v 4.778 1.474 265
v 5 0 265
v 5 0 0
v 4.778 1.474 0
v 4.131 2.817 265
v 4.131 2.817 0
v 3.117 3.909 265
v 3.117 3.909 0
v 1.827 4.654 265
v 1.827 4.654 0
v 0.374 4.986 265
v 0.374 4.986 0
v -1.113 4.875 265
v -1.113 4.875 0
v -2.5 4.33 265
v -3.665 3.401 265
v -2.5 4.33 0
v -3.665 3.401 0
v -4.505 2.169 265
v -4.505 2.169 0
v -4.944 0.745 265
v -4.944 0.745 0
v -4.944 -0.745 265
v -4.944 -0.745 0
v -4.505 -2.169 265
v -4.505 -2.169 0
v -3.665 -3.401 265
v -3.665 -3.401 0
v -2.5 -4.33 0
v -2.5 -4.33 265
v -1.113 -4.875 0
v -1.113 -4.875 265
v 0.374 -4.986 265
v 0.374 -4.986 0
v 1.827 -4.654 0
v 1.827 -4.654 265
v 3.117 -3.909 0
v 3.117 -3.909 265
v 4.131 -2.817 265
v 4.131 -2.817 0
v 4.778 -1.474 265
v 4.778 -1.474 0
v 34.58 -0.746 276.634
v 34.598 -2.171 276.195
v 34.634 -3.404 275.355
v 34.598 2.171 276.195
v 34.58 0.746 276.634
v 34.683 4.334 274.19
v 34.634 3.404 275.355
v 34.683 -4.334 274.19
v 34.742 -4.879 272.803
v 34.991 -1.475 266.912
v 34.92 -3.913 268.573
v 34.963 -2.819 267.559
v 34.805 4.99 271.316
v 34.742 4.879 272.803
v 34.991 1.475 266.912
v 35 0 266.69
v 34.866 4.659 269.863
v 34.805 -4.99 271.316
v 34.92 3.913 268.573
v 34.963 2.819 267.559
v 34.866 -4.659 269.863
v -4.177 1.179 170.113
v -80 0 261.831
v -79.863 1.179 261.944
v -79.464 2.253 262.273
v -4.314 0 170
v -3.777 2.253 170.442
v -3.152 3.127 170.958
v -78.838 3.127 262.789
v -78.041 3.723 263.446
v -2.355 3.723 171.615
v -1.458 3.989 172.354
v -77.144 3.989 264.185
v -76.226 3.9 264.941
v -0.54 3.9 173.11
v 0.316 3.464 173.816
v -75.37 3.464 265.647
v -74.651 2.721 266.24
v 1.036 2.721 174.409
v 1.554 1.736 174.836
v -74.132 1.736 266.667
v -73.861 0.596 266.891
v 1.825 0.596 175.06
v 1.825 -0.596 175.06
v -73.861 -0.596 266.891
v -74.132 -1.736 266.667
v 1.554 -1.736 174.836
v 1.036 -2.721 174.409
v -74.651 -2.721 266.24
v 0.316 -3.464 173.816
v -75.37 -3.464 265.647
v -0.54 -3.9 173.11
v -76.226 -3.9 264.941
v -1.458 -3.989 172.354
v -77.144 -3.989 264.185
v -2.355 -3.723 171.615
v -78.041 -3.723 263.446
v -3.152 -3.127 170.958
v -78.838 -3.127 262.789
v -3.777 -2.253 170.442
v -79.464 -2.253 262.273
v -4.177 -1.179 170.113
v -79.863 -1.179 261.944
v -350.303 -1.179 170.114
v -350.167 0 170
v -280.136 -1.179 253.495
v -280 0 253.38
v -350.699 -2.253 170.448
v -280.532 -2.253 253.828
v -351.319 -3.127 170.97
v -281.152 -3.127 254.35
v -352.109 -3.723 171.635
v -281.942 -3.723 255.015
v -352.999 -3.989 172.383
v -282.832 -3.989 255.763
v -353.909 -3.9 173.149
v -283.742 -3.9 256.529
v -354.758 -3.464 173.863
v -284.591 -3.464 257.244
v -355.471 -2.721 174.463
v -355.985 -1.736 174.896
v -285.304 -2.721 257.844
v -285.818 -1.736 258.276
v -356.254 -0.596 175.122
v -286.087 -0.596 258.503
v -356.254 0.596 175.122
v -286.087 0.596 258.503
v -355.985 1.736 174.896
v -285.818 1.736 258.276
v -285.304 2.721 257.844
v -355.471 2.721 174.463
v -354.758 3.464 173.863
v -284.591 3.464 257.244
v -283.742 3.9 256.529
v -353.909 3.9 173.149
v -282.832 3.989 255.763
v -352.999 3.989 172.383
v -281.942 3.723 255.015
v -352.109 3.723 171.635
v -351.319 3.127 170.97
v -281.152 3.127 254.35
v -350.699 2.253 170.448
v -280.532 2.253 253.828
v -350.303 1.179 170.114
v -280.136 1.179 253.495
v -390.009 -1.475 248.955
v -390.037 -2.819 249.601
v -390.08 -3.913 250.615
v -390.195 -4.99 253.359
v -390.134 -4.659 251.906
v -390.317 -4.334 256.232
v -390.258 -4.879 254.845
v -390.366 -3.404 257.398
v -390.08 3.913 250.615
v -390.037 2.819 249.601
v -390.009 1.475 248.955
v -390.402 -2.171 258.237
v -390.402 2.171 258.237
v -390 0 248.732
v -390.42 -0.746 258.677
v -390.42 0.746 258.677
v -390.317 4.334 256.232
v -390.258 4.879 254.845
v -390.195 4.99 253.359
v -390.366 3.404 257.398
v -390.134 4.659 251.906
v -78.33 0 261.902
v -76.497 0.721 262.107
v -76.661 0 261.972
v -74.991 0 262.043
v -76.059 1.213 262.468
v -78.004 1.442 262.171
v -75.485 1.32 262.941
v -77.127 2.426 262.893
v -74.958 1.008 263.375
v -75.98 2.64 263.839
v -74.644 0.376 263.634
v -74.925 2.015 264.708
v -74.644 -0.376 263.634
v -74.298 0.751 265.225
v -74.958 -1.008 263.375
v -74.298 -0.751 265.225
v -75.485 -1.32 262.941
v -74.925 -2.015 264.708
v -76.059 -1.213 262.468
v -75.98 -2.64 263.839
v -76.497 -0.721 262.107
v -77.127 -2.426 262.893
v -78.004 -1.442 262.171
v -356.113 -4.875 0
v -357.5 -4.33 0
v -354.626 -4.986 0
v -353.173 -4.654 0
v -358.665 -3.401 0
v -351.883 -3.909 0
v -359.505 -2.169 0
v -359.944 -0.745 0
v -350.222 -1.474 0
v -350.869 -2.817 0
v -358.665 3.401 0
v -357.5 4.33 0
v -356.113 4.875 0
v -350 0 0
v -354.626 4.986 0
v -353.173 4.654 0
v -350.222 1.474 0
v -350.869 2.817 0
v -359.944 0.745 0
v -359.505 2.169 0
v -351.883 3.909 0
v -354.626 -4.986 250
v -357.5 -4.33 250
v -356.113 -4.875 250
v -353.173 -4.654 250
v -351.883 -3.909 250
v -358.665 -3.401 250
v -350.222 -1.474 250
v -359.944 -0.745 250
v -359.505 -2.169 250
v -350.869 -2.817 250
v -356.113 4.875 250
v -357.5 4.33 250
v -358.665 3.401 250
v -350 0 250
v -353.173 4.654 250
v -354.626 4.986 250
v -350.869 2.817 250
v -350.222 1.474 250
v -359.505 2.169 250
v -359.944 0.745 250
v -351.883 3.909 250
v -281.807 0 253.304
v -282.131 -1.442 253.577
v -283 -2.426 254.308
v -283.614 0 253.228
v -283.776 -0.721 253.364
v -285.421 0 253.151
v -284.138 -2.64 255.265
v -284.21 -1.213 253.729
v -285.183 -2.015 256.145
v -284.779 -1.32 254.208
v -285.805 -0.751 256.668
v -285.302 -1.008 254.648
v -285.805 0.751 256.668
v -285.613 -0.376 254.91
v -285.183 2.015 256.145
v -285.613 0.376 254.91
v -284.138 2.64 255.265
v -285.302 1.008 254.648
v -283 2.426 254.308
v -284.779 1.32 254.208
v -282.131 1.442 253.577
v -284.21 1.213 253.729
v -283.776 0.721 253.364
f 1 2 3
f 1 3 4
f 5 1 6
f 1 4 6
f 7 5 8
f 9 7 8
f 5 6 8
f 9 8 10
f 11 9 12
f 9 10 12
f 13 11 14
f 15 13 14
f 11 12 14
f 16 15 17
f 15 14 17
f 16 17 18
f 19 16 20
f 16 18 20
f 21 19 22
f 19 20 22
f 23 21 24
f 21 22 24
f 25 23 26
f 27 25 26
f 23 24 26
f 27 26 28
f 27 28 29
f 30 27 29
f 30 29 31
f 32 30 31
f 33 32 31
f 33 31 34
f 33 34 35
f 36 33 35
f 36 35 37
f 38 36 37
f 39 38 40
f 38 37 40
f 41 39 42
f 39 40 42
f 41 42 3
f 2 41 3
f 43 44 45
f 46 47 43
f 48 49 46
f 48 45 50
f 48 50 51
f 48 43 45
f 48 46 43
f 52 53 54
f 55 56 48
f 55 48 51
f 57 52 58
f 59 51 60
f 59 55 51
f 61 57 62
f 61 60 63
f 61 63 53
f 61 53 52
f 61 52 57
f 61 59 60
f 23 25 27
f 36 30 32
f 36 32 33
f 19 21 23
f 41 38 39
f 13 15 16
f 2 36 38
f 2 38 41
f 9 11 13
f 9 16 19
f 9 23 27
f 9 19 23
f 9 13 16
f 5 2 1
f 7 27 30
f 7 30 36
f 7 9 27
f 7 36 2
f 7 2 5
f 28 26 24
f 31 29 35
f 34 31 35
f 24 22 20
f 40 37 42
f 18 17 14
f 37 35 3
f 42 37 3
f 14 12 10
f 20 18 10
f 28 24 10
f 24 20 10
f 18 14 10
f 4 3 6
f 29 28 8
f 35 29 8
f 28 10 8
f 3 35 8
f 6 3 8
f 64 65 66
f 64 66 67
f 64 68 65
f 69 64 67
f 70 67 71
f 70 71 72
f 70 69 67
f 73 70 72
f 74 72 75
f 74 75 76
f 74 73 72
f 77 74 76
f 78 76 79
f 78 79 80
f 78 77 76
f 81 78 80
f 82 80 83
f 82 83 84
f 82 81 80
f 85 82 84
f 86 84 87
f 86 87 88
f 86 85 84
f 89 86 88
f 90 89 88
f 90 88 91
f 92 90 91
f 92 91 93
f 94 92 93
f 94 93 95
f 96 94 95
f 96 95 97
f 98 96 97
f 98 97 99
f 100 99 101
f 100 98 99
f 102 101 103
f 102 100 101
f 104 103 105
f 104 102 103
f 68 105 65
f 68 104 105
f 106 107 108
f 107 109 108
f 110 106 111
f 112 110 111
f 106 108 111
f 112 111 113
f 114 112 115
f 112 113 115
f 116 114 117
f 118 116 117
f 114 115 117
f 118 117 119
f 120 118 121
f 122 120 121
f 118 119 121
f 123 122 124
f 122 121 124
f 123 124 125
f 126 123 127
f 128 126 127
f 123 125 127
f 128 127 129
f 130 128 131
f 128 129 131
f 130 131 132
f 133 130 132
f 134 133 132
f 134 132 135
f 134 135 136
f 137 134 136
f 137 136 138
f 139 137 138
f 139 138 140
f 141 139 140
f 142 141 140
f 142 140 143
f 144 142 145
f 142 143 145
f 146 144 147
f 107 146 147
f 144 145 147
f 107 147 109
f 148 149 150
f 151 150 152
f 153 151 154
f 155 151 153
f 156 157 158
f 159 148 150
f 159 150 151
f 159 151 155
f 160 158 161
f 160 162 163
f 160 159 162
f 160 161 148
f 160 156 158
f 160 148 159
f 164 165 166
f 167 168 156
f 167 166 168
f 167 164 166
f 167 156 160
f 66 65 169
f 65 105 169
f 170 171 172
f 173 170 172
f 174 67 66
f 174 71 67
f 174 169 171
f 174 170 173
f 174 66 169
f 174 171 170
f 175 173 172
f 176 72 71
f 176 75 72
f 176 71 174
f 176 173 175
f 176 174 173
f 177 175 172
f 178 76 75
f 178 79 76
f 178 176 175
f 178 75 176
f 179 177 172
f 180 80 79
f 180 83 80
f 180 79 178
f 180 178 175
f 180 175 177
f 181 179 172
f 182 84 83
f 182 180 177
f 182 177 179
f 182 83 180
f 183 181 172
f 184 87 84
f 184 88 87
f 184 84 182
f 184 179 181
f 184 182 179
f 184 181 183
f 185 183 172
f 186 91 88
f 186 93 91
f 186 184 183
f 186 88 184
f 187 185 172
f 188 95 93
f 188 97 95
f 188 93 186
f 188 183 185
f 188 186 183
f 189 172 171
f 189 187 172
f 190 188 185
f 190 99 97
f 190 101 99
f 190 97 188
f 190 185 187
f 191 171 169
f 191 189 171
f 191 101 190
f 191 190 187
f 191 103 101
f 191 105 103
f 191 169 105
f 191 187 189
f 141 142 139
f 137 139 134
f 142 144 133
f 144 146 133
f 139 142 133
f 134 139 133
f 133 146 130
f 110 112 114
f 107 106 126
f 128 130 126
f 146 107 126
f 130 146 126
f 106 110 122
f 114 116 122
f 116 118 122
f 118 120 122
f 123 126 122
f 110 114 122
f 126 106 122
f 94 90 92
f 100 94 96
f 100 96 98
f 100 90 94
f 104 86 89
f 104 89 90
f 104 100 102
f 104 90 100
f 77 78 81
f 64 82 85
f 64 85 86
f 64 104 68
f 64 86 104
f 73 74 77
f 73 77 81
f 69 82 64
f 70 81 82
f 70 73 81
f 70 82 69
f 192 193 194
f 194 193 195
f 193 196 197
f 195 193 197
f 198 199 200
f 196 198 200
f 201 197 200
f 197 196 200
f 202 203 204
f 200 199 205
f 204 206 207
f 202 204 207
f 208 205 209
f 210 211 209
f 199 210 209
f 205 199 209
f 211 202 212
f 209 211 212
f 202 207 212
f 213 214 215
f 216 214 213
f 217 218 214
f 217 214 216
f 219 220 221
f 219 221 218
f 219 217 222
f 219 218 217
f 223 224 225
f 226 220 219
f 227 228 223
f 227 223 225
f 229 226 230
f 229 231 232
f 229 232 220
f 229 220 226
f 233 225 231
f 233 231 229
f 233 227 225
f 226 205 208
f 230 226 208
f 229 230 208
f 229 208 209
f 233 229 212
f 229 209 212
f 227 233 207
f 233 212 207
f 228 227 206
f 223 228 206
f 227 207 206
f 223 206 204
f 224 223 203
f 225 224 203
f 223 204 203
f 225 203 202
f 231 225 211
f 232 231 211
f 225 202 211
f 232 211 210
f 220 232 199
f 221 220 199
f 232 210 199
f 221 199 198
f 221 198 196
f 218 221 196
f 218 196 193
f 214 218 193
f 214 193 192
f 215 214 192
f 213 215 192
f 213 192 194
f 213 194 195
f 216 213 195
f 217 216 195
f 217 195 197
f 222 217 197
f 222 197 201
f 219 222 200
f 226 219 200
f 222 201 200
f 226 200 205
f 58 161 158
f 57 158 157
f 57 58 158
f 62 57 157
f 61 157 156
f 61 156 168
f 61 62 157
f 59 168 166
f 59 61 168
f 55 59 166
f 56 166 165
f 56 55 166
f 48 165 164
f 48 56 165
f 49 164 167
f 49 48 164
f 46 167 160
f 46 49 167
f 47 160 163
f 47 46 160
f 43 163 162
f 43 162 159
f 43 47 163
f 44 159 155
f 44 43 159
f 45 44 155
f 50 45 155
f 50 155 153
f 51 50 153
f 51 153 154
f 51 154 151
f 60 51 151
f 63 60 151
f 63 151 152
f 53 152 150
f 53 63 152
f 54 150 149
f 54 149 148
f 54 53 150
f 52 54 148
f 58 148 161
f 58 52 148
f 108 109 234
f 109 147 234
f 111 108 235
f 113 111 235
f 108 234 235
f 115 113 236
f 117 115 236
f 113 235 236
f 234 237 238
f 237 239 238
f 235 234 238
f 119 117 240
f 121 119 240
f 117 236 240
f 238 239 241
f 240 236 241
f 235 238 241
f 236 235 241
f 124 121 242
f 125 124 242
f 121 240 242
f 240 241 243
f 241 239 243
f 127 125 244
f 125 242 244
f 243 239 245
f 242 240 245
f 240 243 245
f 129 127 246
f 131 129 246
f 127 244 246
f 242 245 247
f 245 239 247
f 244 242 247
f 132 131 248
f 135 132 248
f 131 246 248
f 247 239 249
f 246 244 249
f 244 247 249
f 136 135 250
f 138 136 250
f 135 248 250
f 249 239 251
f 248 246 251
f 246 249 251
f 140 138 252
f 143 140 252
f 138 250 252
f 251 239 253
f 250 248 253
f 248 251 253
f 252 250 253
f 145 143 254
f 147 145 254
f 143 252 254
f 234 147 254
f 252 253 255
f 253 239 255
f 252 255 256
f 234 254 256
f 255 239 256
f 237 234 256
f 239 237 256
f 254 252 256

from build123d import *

# Parameters (mm, degrees)
F0_R     = 5
F1_DEPTH = 265
F2_R     = 5
F3_DEPTH = 250


with BuildPart() as f1:
    # F0 (on Top) → F1 (new body)
    with BuildSketch(Plane.XY):
        Circle(F0_R)
    extrude(amount=F1_DEPTH)


with BuildPart() as f3:
    # F2 (on Top) → F3 (new body)
    with BuildSketch(Plane.XY):
        with Locations((-355, 0)):
            Circle(F2_R)
    extrude(amount=F3_DEPTH)


with BuildPart() as f5:
    # F4 (on Front) → F5 (revolve)
    with BuildSketch(Plane.XZ):
        Polygon((-390.2112676056, 253.7323943662), (-390, 248.7323943662), (-360, 250), (-5, 265), (35, 266.6901408451), (34.7887323944, 271.6901408451), align=None)
    revolve(axis=Axis((-177.7112676056, 0, 262.7112676056), (0.9991085135, 0, 0.0422158527)))


with BuildPart() as f7:
    # F6 (on Front) → F7 (revolve)
    with BuildSketch(Plane.XZ):
        Polygon((-353.2274891088, 172.5755120417), (-350.1669764519, 170), (-280, 253.3802816901), (-285.4206267368, 253.1512411238), align=None)
    revolve(axis=Axis((-318.1440008829, 0, 214.2656528867), (-0.6438780104, 0, -0.7651281642)))


with BuildPart() as f8:
    # F6 (on Front) → F8 (revolve)
    with BuildSketch(Plane.XZ):
        Polygon((-74.9909414231, 262.0426362779), (-80, 261.8309859155), (-4.3136975728, 170), (-1.2269794909, 172.5440462816), align=None)
    revolve(axis=Axis((-39.0701307045, 0, 218.4595392393), (0.6360115704, 0, -0.7716795205)))


solid = Compound([f1.part, f3.part, f5.part, f7.part, f8.part])
